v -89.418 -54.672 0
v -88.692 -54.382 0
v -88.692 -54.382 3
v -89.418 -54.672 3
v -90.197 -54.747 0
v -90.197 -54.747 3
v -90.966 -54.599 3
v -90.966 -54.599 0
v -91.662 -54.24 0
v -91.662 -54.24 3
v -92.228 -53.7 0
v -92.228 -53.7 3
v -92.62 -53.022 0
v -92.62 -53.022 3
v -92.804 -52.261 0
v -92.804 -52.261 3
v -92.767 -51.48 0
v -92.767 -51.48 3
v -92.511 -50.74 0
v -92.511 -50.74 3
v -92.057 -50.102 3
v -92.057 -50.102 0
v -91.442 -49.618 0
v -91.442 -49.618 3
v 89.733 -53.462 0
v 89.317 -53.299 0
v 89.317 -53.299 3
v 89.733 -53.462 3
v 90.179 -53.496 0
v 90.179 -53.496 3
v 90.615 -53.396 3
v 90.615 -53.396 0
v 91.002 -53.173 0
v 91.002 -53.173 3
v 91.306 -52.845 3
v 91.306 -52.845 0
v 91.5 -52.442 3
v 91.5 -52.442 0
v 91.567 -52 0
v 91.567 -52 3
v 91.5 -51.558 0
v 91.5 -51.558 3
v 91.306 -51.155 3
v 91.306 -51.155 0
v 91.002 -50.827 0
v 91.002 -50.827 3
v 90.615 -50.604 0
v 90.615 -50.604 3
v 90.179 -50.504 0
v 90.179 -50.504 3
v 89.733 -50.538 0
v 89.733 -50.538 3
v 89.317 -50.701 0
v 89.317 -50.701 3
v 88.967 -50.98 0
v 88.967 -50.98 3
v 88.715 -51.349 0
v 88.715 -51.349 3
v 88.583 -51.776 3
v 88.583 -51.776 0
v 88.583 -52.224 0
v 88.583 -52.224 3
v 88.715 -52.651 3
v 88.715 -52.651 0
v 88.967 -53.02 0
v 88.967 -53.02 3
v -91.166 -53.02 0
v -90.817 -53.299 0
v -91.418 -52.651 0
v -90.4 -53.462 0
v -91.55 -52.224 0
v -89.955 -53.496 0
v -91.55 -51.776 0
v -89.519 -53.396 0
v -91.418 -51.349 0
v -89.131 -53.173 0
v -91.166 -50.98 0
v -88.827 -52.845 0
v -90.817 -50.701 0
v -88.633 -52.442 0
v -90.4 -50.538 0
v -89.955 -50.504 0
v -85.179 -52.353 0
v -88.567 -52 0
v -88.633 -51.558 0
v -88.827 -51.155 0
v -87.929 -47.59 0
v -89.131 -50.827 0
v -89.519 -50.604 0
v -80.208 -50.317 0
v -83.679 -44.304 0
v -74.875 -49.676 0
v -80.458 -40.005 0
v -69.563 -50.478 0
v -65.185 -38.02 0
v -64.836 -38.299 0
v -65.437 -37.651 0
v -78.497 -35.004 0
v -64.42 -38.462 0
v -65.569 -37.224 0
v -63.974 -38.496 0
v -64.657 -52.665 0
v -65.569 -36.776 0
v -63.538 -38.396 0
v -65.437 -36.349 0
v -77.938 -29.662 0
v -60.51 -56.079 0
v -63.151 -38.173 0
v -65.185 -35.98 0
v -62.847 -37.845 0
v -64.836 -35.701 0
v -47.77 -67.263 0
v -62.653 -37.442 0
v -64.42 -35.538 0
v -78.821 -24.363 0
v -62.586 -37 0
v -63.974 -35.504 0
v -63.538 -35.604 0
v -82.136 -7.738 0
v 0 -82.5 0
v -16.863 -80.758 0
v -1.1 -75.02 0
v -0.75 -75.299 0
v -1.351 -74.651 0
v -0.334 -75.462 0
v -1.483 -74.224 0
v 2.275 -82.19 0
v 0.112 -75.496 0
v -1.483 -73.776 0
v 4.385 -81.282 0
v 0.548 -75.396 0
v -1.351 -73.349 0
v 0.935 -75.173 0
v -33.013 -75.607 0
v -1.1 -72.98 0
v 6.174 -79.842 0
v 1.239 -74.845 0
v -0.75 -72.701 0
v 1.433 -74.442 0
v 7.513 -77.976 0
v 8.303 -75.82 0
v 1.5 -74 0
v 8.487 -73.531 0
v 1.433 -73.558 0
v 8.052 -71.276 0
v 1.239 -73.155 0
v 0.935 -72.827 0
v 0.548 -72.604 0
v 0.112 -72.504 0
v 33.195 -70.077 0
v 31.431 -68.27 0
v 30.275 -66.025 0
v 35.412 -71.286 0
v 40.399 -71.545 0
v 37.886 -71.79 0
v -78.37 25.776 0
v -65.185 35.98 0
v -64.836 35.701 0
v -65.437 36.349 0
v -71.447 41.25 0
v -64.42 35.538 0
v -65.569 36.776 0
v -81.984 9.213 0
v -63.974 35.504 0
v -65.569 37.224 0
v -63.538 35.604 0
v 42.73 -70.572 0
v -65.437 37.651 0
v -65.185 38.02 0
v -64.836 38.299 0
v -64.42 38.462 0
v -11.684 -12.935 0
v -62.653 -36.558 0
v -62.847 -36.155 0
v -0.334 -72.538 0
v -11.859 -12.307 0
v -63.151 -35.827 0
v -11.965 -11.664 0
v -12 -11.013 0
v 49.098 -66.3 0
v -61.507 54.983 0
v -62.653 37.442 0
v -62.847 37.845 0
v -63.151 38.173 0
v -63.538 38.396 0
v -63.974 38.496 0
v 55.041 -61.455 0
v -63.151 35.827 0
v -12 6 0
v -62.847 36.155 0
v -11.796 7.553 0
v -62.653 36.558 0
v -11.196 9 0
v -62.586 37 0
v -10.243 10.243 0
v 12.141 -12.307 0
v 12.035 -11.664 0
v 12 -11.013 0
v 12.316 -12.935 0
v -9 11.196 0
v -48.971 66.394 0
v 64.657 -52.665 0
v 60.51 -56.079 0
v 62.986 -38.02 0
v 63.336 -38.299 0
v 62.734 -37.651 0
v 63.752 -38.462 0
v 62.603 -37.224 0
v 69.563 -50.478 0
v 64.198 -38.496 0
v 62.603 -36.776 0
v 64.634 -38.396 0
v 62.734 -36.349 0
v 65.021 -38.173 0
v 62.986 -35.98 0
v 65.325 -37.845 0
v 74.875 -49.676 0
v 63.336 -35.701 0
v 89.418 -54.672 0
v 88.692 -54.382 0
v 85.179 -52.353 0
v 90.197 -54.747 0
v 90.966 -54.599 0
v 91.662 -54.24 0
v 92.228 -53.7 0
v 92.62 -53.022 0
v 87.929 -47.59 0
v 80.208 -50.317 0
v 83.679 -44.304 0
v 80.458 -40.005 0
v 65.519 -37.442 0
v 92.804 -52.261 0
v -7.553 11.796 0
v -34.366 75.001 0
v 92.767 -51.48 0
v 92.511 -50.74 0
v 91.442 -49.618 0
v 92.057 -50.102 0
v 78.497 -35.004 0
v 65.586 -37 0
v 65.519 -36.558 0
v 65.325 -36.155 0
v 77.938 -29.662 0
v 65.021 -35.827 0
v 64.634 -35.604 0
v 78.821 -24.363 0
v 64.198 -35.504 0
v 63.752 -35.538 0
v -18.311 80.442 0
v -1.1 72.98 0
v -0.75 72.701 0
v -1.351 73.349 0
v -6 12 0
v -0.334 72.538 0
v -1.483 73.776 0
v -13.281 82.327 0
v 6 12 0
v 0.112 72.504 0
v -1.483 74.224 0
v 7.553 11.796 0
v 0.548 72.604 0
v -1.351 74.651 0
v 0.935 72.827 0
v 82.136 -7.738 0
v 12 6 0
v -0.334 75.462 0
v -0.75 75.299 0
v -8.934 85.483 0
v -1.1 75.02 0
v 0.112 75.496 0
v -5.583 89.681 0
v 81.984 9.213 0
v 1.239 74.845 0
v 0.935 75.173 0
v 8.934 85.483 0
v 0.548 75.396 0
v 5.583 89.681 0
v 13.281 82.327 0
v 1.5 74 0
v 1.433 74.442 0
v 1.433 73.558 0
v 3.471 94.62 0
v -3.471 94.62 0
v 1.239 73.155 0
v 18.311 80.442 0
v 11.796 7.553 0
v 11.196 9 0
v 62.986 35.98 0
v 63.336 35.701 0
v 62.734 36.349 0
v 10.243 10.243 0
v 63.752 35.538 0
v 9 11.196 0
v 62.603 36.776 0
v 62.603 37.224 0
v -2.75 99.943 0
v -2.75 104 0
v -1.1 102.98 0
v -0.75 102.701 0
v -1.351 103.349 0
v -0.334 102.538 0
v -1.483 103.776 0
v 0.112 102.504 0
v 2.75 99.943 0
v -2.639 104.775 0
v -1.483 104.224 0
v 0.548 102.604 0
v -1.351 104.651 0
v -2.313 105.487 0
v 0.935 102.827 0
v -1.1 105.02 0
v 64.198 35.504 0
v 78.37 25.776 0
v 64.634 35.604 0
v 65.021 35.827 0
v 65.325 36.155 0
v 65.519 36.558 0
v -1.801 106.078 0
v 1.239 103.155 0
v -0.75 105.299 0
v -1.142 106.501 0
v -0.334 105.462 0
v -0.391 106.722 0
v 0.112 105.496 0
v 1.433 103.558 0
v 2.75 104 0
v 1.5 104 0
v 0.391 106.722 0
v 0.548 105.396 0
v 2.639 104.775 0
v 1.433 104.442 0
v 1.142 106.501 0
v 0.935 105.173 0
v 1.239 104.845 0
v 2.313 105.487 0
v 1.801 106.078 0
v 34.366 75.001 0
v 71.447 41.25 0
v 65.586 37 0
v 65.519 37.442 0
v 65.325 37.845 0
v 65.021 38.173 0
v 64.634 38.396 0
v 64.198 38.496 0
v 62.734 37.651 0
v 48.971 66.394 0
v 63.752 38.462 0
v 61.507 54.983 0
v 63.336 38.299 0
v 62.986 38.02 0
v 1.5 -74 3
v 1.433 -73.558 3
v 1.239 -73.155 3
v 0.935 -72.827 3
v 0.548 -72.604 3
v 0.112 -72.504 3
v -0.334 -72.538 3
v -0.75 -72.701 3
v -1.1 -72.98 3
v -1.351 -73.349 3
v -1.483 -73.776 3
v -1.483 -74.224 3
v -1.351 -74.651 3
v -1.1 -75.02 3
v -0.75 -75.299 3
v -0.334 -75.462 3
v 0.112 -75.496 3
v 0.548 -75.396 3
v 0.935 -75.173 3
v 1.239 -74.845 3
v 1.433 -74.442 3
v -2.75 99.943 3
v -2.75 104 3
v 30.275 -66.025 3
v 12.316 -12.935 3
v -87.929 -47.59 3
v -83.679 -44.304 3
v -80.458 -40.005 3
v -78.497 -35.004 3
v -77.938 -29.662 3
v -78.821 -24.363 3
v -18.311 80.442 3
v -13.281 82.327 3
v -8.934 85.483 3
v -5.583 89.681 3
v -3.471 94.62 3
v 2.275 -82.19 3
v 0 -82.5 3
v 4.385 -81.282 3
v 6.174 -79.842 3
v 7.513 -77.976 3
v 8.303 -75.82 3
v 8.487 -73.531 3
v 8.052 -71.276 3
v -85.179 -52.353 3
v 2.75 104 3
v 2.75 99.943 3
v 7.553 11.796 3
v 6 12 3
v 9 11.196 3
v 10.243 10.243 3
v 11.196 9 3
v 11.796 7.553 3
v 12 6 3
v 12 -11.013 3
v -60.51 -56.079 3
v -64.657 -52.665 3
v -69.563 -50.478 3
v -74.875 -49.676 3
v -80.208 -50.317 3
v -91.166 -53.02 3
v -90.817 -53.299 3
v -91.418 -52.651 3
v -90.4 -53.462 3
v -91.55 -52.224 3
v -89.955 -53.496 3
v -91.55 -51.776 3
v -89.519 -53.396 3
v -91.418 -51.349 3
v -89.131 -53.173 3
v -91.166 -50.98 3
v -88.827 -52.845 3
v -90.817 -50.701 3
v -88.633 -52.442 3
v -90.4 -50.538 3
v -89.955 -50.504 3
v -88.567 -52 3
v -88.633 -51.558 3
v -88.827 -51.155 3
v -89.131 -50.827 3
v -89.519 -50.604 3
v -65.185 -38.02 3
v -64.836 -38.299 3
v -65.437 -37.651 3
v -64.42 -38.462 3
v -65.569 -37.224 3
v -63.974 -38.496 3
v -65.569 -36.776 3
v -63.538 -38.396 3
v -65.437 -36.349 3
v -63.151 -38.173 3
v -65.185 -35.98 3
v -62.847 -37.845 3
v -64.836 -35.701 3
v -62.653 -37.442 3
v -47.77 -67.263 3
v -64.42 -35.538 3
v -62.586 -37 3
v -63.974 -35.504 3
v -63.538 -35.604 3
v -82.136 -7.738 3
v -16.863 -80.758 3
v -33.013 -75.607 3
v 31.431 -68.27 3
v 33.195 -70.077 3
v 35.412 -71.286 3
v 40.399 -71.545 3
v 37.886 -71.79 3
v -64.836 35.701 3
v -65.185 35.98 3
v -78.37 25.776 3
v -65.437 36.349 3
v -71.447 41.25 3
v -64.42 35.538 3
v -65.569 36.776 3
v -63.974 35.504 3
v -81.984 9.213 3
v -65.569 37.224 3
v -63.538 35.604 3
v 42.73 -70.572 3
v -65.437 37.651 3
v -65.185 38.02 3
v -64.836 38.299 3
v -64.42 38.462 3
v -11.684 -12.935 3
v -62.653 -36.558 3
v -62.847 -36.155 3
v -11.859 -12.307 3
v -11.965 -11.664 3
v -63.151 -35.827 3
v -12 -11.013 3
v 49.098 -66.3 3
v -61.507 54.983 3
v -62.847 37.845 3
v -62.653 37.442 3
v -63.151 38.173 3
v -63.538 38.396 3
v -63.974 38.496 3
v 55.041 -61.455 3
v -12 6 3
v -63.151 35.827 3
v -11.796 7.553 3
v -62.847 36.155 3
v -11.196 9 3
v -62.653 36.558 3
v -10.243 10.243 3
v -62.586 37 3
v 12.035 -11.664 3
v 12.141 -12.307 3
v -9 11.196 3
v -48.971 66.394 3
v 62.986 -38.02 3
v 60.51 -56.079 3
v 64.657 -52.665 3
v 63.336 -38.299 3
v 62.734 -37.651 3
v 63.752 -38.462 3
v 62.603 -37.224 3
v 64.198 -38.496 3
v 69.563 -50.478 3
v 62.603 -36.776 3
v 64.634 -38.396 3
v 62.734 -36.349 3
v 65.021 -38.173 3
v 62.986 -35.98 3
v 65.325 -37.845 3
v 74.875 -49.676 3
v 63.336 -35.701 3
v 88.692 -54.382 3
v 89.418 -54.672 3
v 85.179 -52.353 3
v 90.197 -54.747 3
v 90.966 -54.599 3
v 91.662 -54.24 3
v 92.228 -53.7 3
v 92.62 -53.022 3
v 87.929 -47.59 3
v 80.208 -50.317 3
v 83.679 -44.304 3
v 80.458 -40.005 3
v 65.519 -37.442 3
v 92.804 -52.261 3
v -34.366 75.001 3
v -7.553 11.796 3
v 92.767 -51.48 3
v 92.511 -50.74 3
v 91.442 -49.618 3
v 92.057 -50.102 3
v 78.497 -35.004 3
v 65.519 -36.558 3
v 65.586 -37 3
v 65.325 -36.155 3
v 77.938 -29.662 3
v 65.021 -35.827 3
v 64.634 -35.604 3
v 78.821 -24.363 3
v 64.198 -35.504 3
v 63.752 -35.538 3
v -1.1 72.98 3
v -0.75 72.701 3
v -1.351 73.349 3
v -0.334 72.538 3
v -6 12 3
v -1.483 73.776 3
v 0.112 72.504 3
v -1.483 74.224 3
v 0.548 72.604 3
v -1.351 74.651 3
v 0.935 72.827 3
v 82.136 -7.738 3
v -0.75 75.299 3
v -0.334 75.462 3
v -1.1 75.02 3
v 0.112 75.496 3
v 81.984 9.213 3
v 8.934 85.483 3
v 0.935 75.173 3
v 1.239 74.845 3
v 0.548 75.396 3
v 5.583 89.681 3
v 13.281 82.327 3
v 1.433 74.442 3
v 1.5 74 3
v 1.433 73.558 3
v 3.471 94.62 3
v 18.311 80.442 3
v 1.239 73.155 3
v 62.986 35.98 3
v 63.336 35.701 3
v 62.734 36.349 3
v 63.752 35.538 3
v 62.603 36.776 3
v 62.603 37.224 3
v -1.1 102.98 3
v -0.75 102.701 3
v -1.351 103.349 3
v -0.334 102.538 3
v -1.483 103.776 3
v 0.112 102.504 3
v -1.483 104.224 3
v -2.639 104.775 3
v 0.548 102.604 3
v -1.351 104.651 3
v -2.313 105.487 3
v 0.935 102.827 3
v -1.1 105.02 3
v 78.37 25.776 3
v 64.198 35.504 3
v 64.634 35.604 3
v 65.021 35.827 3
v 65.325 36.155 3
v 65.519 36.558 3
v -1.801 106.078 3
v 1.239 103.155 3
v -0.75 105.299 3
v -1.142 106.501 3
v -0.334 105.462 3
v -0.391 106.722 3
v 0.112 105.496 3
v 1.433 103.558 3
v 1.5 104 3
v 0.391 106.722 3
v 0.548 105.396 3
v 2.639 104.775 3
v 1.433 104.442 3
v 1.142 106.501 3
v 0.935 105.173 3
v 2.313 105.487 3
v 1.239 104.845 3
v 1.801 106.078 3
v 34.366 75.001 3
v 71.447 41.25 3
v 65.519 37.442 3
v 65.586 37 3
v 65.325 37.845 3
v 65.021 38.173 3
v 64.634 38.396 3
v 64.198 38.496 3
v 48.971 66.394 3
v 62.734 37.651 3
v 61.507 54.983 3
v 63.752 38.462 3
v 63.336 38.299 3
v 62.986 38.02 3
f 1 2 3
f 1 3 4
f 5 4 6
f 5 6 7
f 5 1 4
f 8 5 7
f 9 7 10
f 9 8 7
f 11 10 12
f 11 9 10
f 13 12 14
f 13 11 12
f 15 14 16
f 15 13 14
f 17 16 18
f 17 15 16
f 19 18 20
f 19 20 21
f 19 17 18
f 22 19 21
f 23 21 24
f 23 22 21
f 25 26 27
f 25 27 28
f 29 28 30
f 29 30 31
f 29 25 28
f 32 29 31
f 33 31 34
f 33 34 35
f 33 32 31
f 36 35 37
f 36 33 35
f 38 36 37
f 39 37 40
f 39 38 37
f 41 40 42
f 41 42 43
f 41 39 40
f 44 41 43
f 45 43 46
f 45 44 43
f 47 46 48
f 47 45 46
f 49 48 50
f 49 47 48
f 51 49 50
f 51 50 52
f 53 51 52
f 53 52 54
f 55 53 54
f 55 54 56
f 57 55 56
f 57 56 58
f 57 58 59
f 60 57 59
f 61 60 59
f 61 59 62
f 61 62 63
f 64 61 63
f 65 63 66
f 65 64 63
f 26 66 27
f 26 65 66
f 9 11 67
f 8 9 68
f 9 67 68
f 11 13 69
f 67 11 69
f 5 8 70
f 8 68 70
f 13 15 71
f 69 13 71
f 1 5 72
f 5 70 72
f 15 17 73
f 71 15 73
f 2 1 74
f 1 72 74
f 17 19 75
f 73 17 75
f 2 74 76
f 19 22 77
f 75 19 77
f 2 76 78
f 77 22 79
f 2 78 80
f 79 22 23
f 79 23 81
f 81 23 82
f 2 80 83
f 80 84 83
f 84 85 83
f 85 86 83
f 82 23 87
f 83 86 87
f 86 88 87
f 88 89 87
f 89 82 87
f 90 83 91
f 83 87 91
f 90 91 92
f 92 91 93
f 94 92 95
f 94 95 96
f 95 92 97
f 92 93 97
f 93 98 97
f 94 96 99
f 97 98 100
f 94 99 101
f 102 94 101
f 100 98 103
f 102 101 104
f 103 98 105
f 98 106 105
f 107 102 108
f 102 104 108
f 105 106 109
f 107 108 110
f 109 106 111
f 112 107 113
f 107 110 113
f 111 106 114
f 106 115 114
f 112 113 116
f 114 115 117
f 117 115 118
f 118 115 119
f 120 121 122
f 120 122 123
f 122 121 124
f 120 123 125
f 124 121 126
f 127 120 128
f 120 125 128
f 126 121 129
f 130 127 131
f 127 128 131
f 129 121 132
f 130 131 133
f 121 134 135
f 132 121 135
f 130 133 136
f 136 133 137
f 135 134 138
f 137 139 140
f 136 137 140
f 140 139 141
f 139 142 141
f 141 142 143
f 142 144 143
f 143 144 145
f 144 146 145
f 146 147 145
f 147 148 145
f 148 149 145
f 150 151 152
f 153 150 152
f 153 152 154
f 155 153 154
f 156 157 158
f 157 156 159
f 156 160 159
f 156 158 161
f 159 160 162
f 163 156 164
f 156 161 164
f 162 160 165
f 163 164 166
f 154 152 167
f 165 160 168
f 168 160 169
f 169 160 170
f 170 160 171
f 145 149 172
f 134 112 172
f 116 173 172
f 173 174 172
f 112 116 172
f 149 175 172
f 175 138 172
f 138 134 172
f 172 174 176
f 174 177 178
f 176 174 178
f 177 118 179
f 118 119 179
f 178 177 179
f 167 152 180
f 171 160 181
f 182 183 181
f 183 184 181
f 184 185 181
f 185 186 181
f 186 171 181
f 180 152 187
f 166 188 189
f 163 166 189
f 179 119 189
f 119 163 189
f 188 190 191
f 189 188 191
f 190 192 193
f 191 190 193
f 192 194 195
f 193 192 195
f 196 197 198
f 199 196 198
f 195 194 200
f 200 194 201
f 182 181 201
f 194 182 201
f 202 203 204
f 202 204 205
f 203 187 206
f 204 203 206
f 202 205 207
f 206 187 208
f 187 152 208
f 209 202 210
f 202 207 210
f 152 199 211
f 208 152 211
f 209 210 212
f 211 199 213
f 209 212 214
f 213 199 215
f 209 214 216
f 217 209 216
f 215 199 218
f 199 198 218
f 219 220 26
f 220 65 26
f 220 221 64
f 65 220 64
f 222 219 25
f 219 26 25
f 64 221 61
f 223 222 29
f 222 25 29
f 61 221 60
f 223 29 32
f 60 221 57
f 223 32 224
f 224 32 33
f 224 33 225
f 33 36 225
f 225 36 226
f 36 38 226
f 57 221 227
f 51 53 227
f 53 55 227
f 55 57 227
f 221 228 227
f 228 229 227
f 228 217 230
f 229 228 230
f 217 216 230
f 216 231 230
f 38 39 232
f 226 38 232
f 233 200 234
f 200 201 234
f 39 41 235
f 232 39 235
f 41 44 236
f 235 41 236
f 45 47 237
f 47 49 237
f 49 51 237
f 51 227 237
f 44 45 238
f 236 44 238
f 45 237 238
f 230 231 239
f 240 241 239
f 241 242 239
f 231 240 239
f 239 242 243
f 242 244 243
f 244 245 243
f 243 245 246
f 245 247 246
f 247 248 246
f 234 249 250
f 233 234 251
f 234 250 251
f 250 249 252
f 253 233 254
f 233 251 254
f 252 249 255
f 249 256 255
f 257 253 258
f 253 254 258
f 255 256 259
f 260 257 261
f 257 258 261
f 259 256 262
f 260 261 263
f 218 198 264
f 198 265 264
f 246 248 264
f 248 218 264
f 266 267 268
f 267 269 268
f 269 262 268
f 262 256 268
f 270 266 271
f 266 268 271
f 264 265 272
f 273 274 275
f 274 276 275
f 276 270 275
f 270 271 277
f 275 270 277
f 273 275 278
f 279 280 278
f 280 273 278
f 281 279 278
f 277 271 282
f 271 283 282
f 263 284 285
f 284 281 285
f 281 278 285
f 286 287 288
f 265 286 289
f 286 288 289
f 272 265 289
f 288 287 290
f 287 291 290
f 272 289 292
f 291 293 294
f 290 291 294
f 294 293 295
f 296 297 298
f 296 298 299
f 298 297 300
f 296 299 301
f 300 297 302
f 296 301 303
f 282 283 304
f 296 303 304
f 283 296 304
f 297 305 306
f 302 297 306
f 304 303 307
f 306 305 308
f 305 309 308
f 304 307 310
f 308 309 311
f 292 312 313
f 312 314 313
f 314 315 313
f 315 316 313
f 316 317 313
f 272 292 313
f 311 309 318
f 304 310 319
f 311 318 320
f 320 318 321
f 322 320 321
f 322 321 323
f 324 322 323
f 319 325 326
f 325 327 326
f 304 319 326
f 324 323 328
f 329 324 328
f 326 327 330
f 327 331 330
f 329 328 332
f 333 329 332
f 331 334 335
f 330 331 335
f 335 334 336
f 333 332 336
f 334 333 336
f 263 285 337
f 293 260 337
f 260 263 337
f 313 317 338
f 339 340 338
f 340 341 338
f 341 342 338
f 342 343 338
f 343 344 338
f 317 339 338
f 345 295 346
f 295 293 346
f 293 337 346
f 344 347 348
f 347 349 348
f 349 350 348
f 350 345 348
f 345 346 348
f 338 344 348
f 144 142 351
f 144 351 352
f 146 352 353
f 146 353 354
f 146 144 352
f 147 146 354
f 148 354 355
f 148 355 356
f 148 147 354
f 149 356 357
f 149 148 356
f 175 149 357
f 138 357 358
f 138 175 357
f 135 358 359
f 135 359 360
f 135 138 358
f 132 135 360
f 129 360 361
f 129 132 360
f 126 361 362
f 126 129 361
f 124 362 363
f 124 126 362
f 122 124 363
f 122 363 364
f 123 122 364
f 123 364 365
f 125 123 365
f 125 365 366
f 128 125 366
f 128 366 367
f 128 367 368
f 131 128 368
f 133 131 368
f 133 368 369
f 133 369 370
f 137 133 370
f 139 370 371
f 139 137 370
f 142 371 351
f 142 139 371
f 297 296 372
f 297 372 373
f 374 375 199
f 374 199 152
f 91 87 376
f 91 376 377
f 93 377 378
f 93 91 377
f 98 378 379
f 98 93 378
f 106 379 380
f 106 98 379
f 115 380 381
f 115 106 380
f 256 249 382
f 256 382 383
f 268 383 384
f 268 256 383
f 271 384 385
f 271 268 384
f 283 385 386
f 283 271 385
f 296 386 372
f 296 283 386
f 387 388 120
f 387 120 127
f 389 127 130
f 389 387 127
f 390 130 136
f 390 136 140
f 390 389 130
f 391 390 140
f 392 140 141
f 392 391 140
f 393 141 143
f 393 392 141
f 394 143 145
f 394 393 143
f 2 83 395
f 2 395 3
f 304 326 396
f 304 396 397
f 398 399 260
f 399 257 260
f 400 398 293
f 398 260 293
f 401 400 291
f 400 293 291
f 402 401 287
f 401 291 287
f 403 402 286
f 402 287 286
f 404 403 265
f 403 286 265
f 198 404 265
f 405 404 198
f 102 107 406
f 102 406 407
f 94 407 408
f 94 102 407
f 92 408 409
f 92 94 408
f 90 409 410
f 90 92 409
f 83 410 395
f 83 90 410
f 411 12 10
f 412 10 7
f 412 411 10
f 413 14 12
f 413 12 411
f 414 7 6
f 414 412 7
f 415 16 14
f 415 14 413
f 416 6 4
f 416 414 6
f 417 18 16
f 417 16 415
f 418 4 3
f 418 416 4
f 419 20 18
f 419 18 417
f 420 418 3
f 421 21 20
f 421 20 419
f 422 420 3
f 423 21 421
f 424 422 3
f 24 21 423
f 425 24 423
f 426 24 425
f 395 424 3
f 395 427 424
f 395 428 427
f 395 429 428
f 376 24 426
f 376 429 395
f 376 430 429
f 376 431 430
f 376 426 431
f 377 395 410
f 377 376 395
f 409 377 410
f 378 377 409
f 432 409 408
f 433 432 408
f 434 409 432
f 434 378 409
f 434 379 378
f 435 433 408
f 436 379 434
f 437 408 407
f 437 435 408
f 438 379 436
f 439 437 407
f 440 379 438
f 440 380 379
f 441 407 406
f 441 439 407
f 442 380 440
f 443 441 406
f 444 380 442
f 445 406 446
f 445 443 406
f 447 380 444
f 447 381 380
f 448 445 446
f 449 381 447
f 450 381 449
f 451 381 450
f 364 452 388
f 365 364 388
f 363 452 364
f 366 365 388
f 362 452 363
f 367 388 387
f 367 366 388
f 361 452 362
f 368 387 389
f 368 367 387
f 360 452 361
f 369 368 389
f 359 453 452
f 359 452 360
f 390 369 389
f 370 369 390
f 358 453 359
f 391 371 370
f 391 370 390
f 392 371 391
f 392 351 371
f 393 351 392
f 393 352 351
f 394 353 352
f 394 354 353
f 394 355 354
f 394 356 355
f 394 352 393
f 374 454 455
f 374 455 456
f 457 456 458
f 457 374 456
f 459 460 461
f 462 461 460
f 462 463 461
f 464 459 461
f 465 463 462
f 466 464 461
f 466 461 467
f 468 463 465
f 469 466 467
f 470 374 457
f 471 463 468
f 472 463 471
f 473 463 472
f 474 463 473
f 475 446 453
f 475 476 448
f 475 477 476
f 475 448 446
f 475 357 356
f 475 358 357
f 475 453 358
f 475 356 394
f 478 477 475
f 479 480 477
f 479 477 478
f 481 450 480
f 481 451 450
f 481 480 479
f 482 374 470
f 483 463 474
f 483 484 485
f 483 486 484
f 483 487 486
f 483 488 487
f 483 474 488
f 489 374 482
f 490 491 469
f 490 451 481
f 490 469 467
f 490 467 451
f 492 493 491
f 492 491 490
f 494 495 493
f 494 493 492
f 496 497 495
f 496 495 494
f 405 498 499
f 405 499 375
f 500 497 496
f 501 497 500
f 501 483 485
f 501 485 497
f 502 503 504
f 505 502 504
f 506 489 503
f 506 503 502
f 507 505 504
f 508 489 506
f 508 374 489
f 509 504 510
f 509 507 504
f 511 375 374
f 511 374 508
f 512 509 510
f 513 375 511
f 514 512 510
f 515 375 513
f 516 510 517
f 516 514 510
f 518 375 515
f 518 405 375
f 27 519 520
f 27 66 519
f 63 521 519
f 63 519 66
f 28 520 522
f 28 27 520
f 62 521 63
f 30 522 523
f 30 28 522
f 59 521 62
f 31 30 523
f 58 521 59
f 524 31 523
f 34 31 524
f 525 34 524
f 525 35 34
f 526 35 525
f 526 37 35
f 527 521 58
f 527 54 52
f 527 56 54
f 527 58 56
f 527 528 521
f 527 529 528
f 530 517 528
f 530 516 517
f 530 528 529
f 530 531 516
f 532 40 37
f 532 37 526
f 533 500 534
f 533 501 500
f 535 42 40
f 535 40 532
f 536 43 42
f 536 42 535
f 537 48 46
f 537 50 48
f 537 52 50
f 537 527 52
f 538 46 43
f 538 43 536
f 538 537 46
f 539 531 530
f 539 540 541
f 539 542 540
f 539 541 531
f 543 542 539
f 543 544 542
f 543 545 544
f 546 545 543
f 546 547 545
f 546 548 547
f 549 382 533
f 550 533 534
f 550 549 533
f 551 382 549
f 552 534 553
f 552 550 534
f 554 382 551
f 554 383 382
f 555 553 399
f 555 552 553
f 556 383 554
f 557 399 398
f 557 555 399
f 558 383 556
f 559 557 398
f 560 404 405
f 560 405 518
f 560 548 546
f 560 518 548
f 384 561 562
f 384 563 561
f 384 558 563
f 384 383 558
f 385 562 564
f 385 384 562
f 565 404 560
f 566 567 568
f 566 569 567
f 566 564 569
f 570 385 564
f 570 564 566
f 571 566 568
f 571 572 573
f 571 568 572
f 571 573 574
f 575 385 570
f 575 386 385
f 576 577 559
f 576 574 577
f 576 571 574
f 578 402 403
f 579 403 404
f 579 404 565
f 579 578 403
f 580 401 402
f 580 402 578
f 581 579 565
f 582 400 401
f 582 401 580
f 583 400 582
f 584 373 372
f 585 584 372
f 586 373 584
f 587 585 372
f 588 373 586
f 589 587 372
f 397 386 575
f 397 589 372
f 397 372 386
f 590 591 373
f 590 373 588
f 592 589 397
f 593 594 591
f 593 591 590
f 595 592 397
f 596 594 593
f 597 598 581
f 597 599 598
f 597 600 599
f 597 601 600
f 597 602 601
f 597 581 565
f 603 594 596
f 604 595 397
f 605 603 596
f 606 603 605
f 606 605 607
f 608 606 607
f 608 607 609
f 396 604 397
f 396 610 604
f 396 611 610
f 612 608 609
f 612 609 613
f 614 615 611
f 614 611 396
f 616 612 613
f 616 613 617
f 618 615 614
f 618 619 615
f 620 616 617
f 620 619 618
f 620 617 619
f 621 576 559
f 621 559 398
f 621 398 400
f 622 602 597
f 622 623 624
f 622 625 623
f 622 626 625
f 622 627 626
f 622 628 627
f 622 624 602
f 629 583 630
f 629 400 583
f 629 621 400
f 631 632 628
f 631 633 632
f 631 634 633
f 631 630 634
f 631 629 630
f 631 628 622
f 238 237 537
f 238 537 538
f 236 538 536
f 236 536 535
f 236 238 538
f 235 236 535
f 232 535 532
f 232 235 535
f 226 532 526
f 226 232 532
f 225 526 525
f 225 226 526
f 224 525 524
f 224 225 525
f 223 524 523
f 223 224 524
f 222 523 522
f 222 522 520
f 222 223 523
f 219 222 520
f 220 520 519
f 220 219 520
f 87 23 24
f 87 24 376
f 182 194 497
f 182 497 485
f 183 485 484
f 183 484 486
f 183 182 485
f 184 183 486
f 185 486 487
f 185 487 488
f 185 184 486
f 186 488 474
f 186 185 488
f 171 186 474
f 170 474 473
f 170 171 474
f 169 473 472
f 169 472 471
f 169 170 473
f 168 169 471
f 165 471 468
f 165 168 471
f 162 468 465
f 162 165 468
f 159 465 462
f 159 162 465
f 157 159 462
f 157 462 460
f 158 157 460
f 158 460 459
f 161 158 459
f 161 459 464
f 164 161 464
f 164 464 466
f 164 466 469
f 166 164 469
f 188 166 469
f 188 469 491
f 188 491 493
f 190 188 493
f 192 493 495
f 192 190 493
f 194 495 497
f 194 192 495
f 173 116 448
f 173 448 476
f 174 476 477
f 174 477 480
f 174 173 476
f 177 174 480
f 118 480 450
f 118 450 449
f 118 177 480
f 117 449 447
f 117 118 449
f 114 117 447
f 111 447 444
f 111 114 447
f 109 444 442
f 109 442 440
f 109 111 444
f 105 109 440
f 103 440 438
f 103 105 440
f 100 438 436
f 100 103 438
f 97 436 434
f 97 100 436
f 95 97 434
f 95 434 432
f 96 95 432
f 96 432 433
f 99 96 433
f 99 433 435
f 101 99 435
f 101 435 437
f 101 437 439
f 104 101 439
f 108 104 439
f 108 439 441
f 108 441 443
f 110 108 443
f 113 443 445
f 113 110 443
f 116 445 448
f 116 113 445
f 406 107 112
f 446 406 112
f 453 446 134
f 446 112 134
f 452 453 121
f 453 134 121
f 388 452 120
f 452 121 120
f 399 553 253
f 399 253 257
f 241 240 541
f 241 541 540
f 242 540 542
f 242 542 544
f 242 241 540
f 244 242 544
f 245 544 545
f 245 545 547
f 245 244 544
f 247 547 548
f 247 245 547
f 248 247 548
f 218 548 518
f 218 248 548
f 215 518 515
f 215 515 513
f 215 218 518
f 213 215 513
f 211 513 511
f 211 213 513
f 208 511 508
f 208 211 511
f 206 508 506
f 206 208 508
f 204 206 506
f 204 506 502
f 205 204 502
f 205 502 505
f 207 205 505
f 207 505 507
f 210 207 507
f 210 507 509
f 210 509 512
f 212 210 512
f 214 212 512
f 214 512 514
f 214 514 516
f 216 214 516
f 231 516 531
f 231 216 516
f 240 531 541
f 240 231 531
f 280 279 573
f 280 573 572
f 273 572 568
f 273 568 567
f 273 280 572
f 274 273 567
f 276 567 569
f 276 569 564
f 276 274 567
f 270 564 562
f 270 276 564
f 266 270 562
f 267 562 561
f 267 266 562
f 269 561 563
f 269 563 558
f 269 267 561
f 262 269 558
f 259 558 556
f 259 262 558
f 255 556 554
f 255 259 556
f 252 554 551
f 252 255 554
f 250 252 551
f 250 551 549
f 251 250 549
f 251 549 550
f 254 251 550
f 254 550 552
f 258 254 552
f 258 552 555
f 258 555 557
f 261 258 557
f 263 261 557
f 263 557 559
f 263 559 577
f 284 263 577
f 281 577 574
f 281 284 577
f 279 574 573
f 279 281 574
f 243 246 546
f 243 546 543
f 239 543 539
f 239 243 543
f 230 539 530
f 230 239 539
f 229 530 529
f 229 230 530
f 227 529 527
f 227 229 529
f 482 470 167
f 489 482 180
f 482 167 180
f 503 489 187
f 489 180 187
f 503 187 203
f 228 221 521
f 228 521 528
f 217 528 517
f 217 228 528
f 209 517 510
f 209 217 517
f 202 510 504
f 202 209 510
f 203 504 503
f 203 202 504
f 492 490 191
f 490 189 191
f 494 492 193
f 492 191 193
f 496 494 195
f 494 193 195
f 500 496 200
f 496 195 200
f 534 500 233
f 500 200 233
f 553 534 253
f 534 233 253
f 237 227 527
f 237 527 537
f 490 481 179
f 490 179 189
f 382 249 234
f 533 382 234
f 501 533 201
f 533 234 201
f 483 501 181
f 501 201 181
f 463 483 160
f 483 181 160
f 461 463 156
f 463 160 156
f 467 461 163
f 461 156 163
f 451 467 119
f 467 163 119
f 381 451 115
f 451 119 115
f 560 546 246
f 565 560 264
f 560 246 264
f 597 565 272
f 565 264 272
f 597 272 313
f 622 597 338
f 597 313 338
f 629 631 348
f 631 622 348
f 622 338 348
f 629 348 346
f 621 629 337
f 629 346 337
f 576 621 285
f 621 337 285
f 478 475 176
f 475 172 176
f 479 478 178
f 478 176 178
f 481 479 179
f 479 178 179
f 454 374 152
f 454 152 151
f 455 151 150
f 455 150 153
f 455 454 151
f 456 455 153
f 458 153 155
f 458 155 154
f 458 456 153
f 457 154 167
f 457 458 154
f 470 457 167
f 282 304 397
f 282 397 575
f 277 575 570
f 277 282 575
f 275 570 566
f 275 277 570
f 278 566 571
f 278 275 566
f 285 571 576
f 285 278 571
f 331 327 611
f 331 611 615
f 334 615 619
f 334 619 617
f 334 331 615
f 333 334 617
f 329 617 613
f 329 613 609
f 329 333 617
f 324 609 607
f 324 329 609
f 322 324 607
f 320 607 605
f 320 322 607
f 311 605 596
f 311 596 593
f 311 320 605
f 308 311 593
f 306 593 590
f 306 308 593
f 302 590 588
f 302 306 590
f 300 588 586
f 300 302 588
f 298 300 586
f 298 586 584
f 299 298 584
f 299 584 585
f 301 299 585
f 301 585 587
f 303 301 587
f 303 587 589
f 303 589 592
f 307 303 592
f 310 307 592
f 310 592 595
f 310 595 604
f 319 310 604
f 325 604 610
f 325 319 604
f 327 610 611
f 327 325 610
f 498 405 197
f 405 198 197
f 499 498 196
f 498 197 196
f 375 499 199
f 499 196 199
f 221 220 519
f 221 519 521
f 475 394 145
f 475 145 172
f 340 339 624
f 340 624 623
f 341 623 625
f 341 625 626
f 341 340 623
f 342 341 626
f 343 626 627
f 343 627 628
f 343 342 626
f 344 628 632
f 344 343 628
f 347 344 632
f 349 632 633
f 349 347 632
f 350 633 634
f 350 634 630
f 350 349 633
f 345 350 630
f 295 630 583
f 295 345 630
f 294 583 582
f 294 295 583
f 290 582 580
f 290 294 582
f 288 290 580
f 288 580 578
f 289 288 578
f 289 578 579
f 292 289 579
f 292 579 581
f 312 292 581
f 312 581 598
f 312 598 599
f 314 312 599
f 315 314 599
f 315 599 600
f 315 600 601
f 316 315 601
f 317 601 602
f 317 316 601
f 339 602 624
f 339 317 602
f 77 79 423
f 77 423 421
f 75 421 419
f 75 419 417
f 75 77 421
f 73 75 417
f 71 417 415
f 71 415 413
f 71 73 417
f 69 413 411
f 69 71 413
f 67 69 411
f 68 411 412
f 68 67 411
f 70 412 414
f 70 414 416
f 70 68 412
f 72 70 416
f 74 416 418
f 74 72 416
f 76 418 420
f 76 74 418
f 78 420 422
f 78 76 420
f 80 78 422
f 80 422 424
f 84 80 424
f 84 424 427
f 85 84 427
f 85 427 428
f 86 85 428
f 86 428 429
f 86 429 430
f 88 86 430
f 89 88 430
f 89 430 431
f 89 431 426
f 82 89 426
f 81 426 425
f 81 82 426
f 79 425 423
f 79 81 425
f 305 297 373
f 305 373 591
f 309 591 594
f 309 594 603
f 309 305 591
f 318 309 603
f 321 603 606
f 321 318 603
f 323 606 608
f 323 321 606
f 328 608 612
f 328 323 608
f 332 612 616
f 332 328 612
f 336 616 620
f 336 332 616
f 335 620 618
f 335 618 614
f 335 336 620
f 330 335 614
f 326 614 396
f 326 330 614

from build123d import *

# Parameters (mm, degrees)
SKETCH1_R           = 82.5
SKETCH1_R_2         = 1.5
BOSS_EXTRUDE1_DEPTH = 3
CUT_EXTRUDE1_DEPTH  = 117.711181984
FILLET1_R           = 6
BOSS_EXTRUDE2_START = -3
SKETCH3_R           = 1.5
BOSS_EXTRUDE2_DEPTH = 3
CIRPATTERN1_COUNT   = 3


with BuildPart() as part:
    # Sketch1 → Boss-Extrude1 (new body)
    with BuildSketch(Plane.XY):
        Circle(SKETCH1_R)
        with Locations((0, 74)):
            Circle(SKETCH1_R_2, mode=Mode.SUBTRACT)
        with Locations((0, -74)):
            Circle(SKETCH1_R_2, mode=Mode.SUBTRACT)
        with Locations((64.08587988, 37)):
            Circle(SKETCH1_R_2, mode=Mode.SUBTRACT)
        with Locations((64.08587988, -37)):
            Circle(SKETCH1_R_2, mode=Mode.SUBTRACT)
        with Locations((-64.08587988, -37)):
            Circle(SKETCH1_R_2, mode=Mode.SUBTRACT)
        with Locations((-64.08587988, 37)):
            Circle(SKETCH1_R_2, mode=Mode.SUBTRACT)
    extrude(amount=BOSS_EXTRUDE1_DEPTH)

    # Sketch2 → Cut-Extrude1 (cut, through all)
    with BuildSketch(Plane.XY.offset(3)):
        with BuildLine():
            Line((12, -12), (30.275351929, -66.024842017))
            ThreePointArc((30.275351929, -66.024842017), (35.411833596, -71.285530901), (42.729580876, -70.572182325))
            ThreePointArc((42.729580876, -70.572182325), (22.181579725, -79.462113746), (0, -82.5))
            ThreePointArc((0, -82.5), (6.906581307, -78.954708332), (8.051787281, -71.276266978))
            Line((8.051787281, -71.276266978), (-12, -12))
            Line((-12, -12), (-12, 12))
            Line((-12, 12), (12, 12))
            Line((12, 12), (12, -12))
        make_face()
    extrude(amount=-CUT_EXTRUDE1_DEPTH, mode=Mode.SUBTRACT)

    # Fillet1
    fillet1_edges = [part.edges().sort_by_distance(p)[0] for p in [
        (12, 12, 1.5),
        (12, -12, 1.5),
        (-12, -12, 1.5),
        (-12, 12, 1.5),
    ]]
    fillet(fillet1_edges, radius=FILLET1_R)

    # Sketch3 → Boss-Extrude2 (add)
    with BuildSketch(Plane.XY.offset(3).offset(BOSS_EXTRUDE2_START)):
        with BuildLine():
            Line((2.75, 104), (2.75, 99.943421494))
            ThreePointArc((2.75, 99.943421494), (7.117014236, 87.469057539), (18.31097561, 80.442266081))
            ThreePointArc((18.31097561, 80.442266081), (0, 82.5), (-18.31097561, 80.442266081))
            ThreePointArc((-18.31097561, 80.442266081), (-7.117014236, 87.469057539), (-2.75, 99.943421494))
            Line((-2.75, 99.943421494), (-2.75, 104))
            ThreePointArc((-2.75, 104), (0, 106.75), (2.75, 104))
        make_face()
        with Locations((0, 104)):
            Circle(SKETCH3_R, mode=Mode.SUBTRACT)
    boss_extrude2 = extrude(amount=BOSS_EXTRUDE2_DEPTH)

    # CirPattern1: Boss-Extrude2 ×3 about axis
    cirpattern1_axis = Axis((0, 0, 0), (0, 0, 1))
    for i in range(1, CIRPATTERN1_COUNT):
        add(boss_extrude2.rotate(cirpattern1_axis, i * 360 / CIRPATTERN1_COUNT))


solid = part.part
